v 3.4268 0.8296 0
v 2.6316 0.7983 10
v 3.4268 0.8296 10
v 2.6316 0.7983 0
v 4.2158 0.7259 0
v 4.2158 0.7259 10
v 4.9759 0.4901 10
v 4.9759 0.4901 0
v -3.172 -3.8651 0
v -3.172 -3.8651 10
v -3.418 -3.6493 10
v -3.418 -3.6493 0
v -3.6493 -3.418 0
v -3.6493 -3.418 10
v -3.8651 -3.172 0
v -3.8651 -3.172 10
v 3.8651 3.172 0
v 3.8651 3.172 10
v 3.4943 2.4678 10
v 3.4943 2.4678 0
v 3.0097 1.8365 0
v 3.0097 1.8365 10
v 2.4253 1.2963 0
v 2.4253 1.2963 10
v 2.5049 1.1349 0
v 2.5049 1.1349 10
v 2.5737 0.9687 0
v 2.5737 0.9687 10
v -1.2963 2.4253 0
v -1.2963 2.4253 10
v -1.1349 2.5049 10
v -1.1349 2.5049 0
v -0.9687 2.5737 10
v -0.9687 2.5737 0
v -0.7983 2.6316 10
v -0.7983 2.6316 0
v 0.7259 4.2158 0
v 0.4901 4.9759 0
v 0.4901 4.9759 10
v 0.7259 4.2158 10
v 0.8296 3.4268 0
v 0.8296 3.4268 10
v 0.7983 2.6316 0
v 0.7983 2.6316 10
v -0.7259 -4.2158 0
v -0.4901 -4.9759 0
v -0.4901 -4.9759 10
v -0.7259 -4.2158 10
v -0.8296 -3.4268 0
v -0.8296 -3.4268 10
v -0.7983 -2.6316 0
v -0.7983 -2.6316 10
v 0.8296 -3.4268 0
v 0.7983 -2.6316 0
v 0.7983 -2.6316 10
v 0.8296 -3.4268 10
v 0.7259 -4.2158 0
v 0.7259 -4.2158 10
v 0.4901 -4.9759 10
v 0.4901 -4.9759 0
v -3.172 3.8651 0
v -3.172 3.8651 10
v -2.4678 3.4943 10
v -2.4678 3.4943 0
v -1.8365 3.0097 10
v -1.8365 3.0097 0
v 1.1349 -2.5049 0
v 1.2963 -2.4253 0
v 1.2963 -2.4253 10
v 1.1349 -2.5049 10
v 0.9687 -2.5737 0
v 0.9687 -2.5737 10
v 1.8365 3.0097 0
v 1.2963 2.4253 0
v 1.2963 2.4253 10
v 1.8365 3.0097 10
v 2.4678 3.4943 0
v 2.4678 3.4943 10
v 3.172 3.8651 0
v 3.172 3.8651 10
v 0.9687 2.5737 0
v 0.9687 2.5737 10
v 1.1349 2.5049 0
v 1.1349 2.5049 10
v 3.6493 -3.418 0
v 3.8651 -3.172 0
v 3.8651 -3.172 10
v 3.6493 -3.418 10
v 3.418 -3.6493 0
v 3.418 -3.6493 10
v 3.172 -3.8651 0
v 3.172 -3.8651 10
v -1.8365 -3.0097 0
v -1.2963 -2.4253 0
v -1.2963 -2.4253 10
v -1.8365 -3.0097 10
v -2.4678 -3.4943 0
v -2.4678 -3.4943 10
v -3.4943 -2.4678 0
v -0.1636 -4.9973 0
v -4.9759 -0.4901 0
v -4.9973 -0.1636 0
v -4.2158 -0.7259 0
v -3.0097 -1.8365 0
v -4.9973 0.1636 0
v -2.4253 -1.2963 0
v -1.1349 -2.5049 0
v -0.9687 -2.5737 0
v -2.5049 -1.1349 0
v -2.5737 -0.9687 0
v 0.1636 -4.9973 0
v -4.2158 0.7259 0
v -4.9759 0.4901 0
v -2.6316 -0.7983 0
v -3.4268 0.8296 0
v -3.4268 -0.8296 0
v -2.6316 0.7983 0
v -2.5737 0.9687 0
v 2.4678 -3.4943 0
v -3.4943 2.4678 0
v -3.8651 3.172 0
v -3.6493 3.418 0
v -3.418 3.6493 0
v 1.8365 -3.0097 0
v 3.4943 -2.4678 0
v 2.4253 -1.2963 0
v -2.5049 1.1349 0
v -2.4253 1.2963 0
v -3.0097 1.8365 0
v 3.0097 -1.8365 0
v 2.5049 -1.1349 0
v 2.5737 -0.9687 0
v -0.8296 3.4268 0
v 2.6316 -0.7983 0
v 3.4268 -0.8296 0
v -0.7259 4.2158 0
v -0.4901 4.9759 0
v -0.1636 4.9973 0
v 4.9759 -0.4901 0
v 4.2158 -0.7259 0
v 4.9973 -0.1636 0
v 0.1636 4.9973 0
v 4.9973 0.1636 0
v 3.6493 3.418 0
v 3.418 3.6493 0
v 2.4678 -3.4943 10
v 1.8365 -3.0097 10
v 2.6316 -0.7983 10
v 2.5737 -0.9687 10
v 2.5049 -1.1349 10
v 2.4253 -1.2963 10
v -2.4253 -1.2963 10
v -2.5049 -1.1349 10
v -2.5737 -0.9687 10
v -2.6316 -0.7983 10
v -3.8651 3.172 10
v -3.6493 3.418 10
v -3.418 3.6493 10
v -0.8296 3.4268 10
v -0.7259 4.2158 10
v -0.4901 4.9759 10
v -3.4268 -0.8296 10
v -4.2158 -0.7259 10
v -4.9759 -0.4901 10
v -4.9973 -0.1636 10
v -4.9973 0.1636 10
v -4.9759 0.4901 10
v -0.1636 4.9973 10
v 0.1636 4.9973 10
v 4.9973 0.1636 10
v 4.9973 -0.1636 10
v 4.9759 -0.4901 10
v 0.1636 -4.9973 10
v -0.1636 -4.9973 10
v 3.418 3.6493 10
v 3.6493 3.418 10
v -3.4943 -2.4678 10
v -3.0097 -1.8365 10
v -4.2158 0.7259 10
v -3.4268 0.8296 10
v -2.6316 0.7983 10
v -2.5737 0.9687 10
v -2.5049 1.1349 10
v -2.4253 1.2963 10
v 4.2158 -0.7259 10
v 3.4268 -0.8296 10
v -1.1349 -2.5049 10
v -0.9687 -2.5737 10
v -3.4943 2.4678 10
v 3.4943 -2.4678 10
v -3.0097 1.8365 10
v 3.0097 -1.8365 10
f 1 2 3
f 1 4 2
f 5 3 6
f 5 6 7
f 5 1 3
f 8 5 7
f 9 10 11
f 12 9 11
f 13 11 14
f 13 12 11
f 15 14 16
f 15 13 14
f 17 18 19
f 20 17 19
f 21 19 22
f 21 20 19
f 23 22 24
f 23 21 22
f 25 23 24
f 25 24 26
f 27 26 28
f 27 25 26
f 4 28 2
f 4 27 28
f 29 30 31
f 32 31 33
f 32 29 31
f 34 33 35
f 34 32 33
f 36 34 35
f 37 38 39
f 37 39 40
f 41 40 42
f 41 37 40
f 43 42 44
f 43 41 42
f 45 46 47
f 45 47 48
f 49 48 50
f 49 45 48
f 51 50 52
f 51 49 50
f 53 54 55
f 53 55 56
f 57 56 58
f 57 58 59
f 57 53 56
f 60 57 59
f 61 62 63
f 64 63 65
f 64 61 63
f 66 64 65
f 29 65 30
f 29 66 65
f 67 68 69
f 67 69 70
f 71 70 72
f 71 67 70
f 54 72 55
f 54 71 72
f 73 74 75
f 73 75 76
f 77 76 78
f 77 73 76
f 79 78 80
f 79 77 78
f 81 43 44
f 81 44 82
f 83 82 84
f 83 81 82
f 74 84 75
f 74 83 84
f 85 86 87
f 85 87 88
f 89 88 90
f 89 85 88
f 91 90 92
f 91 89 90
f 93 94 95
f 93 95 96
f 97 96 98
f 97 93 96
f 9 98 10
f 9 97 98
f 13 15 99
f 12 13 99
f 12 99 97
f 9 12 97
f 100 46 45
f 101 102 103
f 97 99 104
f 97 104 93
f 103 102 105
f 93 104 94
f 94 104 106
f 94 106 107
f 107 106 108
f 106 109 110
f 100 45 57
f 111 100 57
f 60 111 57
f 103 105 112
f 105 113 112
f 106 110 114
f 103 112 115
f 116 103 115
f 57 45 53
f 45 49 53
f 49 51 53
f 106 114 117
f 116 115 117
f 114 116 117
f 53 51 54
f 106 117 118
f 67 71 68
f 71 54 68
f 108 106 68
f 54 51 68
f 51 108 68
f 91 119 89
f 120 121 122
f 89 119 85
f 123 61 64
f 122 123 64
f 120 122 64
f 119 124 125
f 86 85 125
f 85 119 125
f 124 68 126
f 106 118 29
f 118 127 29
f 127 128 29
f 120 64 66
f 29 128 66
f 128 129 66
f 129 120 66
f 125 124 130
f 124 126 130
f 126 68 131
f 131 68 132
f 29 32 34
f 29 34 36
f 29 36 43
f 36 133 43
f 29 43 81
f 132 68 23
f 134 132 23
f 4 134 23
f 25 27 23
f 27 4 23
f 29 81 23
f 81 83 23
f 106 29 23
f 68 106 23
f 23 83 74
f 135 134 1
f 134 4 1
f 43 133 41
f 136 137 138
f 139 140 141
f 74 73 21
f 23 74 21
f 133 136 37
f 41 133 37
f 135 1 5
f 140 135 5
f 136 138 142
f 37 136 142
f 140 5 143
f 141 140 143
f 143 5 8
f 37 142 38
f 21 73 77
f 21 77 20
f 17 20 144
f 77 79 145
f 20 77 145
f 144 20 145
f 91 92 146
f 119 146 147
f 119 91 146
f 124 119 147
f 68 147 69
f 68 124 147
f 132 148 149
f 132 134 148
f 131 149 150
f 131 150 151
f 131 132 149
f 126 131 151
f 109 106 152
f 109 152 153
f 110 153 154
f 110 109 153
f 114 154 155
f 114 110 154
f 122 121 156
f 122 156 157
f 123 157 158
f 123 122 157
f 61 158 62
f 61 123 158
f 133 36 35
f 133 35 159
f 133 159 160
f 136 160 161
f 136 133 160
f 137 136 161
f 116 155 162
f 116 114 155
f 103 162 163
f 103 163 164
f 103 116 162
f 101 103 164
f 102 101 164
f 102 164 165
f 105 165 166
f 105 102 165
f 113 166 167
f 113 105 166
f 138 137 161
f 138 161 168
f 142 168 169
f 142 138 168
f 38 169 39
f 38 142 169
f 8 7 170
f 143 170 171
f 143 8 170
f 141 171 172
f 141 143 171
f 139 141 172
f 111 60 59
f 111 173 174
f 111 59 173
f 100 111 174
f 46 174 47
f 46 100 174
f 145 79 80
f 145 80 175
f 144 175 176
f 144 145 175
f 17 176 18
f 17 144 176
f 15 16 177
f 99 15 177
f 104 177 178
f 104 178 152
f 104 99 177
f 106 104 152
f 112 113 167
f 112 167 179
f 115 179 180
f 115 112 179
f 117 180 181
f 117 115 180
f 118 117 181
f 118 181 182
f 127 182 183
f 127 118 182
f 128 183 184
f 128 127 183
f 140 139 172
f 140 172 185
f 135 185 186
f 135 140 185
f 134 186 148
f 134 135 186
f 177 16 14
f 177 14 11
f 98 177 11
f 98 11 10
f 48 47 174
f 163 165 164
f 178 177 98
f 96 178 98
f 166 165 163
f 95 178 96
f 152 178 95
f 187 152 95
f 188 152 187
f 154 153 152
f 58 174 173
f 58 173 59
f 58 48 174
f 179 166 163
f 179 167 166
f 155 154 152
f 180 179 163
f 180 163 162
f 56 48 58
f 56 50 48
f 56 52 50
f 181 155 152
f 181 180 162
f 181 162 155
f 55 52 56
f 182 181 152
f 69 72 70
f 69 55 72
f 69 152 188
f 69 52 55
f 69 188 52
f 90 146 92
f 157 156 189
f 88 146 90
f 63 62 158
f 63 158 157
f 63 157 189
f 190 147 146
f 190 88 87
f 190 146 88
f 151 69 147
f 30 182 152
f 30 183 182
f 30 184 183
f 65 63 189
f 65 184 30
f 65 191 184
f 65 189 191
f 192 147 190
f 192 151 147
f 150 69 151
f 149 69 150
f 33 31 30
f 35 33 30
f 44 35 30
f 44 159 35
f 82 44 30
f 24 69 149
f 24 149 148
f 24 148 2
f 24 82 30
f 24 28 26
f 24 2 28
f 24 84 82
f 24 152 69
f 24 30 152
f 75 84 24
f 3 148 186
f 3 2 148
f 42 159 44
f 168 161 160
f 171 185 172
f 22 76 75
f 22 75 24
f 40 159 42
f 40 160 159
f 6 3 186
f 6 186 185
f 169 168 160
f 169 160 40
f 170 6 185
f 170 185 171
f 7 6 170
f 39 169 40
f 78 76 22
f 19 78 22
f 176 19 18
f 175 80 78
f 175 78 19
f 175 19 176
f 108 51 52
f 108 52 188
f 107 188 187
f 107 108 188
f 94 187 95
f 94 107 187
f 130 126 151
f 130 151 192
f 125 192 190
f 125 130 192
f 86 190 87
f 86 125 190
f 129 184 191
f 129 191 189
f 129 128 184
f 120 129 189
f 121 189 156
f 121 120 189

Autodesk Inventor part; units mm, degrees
sketch "Sketch1" plane through (0, 0, 0) normal (0, 0, 1) x (1, 0, 0)
  circle A0 centre (0, 0) radius 5
  dimension "d0" = 10
extrude "Extrusion1" add sketch "Sketch1" along normal blind 10
ref_plane "Work Plane2" through (0, 0, 5) normal (0, 0, 1) x (1, 0, 0)
sketch "Sketch2" plane through (0, 0, 0) normal (0, 0, -1) x (-1, 0, 0)
  circle A0 centre (0, 0) radius 5 projected
  circle A1 centre (0, 0) radius 4
  dimension "d3" = 8
surface extrude "Pitch Diameter" sketch "Sketch2" against normal through all shown no curves A1
ref_plane "Work Plane8" through (0, 0, 0) normal (0.9238795, 0.3826834, 0) x (0, 0, 1)
ref_plane "Work Plane9" through (0, 0, 0) normal (1, 0, 0) x (0, 1, 0)
spur gear teeth "Spur Gear" teeth 8 pitch diameter 8 tip diameter 10 root diameter 5.5 face width 10 start plane through (0, 0, 0) normal (0, 0, -1) x (-1, 0, 0)
equation "\"d0\" = da_da"
equation "\"d1\" = da_b"
equation "\"d3\" = da_d"
equation "\"d16\" = da_aw"
equation "\"d43\" = da_aw"
equation "\"d46\" = da_aw"
equation "\"da_da\" = 10"
equation "\"da_b\" = 10"
equation "\"da_d\" = 8"
equation "\"da_aw\" = 14"
properties part number "Spur Gear1" material "Steel"
